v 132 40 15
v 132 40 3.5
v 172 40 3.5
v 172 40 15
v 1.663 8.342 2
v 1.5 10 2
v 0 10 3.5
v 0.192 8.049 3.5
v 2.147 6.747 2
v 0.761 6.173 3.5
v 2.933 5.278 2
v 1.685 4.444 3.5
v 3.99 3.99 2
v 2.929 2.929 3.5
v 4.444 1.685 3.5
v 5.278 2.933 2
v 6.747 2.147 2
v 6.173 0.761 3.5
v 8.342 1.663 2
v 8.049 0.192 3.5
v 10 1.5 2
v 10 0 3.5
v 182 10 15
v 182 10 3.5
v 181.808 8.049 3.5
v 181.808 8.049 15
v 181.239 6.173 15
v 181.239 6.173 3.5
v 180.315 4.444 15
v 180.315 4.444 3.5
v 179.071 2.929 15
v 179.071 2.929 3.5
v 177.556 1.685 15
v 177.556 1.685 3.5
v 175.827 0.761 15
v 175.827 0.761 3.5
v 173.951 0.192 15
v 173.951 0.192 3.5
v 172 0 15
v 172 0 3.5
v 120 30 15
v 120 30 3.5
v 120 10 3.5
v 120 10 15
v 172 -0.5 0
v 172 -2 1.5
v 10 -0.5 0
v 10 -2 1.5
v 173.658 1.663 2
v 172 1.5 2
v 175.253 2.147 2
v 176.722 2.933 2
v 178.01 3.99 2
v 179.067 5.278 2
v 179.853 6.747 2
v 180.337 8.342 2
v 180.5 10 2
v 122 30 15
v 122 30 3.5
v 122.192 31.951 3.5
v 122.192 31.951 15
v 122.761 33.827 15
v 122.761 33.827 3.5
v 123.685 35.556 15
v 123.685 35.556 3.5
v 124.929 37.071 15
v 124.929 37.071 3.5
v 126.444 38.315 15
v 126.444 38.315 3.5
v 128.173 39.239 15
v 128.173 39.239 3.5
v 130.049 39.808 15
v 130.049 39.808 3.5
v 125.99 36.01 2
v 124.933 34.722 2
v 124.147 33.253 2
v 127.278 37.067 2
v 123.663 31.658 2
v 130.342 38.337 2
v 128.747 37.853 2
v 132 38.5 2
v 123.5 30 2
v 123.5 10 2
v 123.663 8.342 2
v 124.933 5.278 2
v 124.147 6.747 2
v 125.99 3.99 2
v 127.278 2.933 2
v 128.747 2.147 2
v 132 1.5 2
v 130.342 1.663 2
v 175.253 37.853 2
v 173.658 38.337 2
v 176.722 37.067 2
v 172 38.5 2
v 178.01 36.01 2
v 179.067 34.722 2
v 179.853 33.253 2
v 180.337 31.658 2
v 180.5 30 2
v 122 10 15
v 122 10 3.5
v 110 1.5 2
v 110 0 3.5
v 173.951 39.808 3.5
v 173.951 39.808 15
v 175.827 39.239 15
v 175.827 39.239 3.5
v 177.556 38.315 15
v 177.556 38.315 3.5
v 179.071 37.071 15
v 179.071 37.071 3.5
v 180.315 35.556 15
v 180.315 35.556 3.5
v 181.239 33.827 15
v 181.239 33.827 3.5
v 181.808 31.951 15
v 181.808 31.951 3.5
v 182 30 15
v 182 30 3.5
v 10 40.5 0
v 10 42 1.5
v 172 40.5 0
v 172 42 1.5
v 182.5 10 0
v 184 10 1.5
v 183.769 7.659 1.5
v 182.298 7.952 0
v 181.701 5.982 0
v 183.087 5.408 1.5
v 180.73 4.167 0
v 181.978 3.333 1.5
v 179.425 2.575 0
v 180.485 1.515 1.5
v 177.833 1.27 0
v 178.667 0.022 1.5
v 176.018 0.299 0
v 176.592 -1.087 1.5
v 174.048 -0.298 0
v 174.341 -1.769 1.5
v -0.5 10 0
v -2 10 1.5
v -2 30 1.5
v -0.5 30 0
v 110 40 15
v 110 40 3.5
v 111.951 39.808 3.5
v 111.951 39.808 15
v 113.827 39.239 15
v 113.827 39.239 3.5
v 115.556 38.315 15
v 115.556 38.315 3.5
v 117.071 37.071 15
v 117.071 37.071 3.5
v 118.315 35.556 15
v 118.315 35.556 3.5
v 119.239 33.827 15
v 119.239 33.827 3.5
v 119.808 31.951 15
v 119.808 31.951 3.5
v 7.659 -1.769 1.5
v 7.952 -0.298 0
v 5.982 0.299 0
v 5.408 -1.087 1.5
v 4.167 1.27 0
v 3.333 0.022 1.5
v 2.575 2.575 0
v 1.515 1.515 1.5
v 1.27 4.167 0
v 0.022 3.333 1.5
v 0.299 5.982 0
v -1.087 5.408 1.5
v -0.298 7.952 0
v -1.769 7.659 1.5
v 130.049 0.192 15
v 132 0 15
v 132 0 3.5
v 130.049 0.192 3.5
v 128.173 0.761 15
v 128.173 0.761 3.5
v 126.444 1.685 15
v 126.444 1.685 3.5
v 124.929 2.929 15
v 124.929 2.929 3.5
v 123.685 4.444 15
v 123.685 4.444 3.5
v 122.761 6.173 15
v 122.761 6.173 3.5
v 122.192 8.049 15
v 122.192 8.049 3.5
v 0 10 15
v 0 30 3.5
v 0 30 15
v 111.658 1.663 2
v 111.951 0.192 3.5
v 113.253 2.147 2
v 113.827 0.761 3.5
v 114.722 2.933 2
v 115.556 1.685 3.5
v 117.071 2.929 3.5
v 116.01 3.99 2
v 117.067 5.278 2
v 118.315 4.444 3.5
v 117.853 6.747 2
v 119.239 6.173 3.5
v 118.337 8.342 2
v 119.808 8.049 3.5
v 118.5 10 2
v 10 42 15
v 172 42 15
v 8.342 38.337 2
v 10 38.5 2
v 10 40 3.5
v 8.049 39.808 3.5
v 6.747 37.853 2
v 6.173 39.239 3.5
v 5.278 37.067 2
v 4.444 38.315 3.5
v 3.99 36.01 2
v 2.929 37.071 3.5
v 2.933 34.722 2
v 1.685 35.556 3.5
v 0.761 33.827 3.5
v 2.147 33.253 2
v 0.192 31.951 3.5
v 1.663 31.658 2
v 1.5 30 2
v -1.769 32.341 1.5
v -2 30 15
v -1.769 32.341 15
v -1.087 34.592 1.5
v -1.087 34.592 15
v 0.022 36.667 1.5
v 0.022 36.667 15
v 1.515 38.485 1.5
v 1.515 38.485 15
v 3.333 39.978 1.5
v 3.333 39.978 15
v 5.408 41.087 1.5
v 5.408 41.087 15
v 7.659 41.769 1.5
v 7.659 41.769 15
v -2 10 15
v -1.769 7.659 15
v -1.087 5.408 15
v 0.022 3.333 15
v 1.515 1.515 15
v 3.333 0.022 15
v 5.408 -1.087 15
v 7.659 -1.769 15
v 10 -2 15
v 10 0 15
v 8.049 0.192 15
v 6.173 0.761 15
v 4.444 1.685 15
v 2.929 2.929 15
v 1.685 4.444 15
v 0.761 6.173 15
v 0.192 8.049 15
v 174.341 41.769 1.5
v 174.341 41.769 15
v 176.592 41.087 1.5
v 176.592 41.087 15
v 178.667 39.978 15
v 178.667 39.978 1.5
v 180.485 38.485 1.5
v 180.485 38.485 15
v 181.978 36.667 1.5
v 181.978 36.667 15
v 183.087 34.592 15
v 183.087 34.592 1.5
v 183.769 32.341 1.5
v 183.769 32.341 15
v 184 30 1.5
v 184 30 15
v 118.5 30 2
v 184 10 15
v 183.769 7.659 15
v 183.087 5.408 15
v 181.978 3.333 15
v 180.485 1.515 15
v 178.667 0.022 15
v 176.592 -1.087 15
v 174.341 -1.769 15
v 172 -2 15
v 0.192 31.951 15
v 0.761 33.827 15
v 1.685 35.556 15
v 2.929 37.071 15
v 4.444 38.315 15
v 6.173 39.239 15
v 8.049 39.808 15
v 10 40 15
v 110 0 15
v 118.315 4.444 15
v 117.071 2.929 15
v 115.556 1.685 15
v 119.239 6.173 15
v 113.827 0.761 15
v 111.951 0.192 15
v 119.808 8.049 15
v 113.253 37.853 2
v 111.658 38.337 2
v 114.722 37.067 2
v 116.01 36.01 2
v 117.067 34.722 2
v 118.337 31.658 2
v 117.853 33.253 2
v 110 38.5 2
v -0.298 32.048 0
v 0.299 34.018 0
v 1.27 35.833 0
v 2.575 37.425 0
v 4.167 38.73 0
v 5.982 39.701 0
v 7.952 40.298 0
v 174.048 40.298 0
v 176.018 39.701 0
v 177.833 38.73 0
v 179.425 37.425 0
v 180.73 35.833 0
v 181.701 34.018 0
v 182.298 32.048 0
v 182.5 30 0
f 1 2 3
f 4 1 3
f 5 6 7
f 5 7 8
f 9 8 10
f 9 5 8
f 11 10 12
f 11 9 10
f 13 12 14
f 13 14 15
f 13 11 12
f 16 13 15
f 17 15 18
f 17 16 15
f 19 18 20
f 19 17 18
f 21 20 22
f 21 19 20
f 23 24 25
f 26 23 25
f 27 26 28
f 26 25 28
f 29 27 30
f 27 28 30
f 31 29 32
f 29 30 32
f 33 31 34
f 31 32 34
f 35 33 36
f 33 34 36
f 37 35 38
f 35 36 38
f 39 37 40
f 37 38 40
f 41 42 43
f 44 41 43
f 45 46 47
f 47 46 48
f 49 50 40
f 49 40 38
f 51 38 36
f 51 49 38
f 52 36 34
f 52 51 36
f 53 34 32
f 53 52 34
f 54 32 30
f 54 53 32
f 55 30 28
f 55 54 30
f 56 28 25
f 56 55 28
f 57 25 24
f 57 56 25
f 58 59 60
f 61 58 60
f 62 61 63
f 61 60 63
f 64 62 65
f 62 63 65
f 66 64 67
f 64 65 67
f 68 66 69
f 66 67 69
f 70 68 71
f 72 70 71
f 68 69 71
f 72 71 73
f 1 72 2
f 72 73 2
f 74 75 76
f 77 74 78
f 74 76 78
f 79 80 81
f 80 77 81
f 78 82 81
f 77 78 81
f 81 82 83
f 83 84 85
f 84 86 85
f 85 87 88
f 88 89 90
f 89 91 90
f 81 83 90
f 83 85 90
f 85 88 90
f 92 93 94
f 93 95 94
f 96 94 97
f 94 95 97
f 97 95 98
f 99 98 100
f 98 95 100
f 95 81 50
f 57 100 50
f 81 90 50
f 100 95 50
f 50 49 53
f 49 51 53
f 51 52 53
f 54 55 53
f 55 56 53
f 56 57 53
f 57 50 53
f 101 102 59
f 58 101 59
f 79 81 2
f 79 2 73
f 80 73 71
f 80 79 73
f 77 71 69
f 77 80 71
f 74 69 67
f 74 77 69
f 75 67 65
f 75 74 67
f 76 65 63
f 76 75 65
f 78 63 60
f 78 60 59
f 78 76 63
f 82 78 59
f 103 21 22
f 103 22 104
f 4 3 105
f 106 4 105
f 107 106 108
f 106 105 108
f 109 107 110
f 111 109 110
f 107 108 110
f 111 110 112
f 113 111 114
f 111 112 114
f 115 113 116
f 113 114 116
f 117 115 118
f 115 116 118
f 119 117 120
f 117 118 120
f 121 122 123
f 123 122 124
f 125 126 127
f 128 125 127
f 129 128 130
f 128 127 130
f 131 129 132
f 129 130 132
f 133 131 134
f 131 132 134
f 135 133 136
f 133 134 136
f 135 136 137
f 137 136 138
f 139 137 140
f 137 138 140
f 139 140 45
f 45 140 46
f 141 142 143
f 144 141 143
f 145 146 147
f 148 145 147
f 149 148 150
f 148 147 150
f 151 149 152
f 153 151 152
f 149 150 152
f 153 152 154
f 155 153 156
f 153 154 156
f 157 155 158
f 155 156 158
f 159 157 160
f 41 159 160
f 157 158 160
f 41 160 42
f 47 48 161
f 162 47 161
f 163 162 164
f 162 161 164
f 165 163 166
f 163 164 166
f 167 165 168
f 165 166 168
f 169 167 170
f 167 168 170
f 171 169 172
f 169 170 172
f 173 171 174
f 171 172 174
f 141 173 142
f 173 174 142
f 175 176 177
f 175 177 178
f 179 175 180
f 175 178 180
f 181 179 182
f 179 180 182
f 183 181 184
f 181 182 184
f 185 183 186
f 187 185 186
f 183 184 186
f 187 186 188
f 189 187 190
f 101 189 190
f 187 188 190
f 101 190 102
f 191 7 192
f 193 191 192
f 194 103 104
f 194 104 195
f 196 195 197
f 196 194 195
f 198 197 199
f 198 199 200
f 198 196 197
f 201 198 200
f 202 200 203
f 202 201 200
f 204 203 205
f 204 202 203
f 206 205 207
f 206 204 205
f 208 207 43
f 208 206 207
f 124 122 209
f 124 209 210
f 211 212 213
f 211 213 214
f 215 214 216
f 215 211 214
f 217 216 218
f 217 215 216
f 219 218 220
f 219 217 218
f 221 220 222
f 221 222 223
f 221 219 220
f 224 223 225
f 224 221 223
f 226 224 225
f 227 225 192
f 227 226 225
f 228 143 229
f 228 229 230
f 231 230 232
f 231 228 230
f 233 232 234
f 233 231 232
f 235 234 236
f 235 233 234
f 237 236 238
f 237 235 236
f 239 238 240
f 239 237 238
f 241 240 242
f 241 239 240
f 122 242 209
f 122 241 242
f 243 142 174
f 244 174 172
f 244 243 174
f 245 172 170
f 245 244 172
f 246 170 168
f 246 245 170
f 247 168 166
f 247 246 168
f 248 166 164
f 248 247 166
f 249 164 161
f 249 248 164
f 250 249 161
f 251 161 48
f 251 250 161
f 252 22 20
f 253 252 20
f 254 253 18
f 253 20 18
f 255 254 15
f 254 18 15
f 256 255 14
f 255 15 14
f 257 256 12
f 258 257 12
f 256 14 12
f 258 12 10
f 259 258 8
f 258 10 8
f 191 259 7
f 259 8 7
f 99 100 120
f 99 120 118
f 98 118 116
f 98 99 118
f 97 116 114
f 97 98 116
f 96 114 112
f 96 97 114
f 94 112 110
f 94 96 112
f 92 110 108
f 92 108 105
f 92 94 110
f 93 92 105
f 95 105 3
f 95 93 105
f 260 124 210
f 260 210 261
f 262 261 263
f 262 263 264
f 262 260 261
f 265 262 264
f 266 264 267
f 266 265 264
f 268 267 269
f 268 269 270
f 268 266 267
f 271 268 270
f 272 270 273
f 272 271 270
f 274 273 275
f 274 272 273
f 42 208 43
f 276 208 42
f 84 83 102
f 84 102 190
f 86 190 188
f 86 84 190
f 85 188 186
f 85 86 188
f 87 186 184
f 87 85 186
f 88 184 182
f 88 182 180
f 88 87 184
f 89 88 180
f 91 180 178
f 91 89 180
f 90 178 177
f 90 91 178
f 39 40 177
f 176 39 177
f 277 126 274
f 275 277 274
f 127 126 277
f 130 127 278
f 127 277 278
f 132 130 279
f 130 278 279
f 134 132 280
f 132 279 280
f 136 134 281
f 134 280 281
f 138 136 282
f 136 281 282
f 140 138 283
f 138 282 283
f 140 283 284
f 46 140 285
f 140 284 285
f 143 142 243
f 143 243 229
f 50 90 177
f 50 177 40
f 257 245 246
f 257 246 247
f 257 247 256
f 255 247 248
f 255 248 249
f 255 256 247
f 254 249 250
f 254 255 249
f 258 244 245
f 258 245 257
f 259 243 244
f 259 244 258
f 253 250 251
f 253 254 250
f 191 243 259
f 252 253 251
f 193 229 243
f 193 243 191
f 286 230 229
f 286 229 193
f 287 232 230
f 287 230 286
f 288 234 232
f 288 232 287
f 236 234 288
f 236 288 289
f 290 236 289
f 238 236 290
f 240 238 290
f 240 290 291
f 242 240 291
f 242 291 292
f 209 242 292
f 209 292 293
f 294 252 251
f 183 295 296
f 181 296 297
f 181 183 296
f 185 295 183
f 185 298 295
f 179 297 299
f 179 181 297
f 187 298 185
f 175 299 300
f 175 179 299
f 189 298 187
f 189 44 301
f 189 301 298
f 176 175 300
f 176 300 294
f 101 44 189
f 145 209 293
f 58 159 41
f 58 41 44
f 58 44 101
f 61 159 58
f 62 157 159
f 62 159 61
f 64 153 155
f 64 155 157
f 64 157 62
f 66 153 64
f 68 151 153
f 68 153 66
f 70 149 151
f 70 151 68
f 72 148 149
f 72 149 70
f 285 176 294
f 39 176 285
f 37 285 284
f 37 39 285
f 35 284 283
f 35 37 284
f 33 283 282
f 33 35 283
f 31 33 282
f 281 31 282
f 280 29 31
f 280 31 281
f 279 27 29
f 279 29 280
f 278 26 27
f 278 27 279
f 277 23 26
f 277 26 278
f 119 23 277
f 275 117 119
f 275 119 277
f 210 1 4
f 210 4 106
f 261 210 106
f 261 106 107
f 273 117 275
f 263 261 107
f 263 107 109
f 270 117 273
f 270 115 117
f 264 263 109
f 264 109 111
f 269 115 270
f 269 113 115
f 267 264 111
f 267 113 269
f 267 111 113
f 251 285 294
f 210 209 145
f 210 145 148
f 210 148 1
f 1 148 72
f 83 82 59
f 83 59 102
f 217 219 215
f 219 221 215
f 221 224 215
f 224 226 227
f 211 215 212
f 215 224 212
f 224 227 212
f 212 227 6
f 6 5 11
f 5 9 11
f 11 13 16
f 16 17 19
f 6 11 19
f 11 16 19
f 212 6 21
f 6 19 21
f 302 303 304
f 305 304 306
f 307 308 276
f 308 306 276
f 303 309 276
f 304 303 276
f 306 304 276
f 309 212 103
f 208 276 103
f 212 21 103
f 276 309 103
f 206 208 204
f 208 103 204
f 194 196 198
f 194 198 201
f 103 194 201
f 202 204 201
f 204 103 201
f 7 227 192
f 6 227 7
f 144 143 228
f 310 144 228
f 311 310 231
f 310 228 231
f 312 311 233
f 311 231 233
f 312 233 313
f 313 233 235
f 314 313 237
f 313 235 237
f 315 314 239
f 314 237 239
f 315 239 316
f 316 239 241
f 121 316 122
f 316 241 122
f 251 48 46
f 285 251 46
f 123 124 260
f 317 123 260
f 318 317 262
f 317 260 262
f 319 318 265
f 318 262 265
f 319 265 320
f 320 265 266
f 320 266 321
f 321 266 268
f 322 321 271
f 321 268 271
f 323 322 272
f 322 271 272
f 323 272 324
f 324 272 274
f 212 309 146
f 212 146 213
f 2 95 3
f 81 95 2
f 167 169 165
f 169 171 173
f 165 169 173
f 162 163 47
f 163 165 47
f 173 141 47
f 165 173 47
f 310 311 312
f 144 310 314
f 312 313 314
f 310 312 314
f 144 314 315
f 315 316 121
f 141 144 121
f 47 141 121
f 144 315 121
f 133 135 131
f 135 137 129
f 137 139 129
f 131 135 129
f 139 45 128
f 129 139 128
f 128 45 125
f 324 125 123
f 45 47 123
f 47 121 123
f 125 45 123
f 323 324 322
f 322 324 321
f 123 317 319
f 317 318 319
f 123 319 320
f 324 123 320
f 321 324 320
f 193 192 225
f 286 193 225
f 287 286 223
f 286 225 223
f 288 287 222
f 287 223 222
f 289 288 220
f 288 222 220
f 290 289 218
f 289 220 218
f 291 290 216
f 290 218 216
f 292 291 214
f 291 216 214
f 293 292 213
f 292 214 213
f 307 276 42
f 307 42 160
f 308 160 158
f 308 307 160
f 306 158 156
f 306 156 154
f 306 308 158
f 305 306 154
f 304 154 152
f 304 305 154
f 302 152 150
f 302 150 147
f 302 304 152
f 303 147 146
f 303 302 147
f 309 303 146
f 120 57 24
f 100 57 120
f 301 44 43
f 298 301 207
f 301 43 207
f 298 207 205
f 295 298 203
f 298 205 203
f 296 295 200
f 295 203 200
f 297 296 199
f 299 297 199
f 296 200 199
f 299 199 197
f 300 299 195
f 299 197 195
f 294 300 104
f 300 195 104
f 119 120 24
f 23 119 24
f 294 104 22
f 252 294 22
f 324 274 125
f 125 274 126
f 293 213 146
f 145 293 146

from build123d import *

# Parameters (mm, degrees)
F0_W     = 186
F0_H     = 44
F1_DEPTH = 15
F2_W     = 186
F2_H     = 44
F3_DEPTH = 2
F4_R     = 12
F5_SIZE  = 1.5


with BuildPart() as f1:
    # F0 (on Top) → F1 (new body)
    with BuildSketch(Plane.XY):
        with Locations((91, 20)):
            Rectangle(F0_W, F0_H)
        with BuildLine():
            ThreePointArc((122, 30), (124.9289321881, 37.0710678119), (132, 40))
            Line((132, 40), (172, 40))
            ThreePointArc((172, 40), (179.0710678119, 37.0710678119), (182, 30))
            Line((182, 30), (182, 10))
            ThreePointArc((182, 10), (179.0710678119, 2.9289321881), (172, 0))
            Line((172, 0), (132, 0))
            ThreePointArc((132, 0), (124.9289321881, 2.9289321881), (122, 10))
            Line((122, 10), (122, 30))
        make_face(mode=Mode.SUBTRACT)
        with BuildLine():
            Line((110, 0), (10, 0))
            ThreePointArc((10, 0), (2.9289321881, 2.9289321881), (0, 10))
            Line((0, 10), (0, 30))
            ThreePointArc((0, 30), (2.9289321881, 37.0710678119), (10, 40))
            Line((10, 40), (110, 40))
            ThreePointArc((110, 40), (117.0710678119, 37.0710678119), (120, 30))
            Line((120, 30), (120, 10))
            ThreePointArc((120, 10), (117.0710678119, 2.9289321881), (110, 0))
        make_face(mode=Mode.SUBTRACT)
    extrude(amount=F1_DEPTH)

    # F2 (on face) → F3 (join)
    with BuildSketch(Plane(origin=(0, 0, 0), x_dir=(1, 0, 0), z_dir=(0, 0, -1))):
        with Locations((91, -20)):
            Rectangle(F2_W, F2_H)
    extrude(amount=-F3_DEPTH)

    # F4
    f4_edges = [f1.edges().sort_by_distance(p)[0] for p in [
        (-2, -2, 7.5),
        (-2, 42, 7.5),
        (184, -2, 7.5),
        (184, 42, 7.5),
    ]]
    fillet(f4_edges, radius=F4_R)

    # F5
    f5_edges = [f1.edges().sort_by_distance(p)[0] for p in [
        (60, 0, 2),
        (117.071068, 2.928932, 2),
        (120, 20, 2),
        (117.071068, 37.071068, 2),
        (60, 40, 2),
        (2.928932, 37.071068, 2),
        (0, 20, 2),
        (2.928932, 2.928932, 2),
        (152, 0, 2),
        (179.071068, 2.928932, 2),
        (182, 20, 2),
        (179.071068, 37.071068, 2),
        (152, 40, 2),
        (124.928932, 37.071068, 2),
        (122, 20, 2),
        (124.928932, 2.928932, 2),
        (180.485281, 1.514719, 0),
    ]]
    chamfer(f5_edges, length=F5_SIZE)


solid = f1.part
